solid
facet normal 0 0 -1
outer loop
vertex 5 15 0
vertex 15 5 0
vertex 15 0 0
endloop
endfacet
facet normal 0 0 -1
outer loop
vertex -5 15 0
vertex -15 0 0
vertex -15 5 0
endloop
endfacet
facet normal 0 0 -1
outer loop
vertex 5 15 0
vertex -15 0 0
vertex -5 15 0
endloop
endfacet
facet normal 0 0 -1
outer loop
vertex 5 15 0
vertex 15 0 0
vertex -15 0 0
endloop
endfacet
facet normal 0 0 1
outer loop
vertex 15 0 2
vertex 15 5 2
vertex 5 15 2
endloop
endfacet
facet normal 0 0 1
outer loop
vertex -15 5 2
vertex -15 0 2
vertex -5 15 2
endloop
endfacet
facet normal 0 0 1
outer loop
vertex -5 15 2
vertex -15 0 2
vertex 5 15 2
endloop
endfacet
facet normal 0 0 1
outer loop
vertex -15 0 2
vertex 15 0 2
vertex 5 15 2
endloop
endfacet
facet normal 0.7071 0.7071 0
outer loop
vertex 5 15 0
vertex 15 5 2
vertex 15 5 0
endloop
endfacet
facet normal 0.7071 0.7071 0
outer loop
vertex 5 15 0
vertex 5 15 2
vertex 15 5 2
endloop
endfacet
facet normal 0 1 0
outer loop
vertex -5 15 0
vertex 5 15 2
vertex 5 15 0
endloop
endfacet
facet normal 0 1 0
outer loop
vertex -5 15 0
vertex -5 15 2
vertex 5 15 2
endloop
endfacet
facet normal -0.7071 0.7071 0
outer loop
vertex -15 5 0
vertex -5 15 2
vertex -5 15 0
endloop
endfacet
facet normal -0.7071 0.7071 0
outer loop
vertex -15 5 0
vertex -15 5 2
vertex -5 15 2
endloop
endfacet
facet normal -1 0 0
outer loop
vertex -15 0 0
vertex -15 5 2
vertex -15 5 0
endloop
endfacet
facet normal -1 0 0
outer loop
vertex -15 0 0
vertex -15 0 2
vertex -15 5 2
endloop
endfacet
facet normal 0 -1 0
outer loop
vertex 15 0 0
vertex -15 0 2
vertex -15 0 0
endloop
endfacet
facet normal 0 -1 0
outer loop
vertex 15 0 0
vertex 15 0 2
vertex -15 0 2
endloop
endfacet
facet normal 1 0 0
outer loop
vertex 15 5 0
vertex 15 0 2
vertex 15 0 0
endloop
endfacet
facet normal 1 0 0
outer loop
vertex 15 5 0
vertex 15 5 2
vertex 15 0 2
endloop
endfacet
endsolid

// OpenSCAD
// plate 3x6 without corner

// external vars #########################

// part ##################################

module plate_3x6_wo_corner() {
  pts = [[-15,0],[-15,5],[-5,15],[5,15],[15,5],[15,0]];
  linear_extrude(height=2,center=false) polygon(pts);
}

plate_3x6_wo_corner();
